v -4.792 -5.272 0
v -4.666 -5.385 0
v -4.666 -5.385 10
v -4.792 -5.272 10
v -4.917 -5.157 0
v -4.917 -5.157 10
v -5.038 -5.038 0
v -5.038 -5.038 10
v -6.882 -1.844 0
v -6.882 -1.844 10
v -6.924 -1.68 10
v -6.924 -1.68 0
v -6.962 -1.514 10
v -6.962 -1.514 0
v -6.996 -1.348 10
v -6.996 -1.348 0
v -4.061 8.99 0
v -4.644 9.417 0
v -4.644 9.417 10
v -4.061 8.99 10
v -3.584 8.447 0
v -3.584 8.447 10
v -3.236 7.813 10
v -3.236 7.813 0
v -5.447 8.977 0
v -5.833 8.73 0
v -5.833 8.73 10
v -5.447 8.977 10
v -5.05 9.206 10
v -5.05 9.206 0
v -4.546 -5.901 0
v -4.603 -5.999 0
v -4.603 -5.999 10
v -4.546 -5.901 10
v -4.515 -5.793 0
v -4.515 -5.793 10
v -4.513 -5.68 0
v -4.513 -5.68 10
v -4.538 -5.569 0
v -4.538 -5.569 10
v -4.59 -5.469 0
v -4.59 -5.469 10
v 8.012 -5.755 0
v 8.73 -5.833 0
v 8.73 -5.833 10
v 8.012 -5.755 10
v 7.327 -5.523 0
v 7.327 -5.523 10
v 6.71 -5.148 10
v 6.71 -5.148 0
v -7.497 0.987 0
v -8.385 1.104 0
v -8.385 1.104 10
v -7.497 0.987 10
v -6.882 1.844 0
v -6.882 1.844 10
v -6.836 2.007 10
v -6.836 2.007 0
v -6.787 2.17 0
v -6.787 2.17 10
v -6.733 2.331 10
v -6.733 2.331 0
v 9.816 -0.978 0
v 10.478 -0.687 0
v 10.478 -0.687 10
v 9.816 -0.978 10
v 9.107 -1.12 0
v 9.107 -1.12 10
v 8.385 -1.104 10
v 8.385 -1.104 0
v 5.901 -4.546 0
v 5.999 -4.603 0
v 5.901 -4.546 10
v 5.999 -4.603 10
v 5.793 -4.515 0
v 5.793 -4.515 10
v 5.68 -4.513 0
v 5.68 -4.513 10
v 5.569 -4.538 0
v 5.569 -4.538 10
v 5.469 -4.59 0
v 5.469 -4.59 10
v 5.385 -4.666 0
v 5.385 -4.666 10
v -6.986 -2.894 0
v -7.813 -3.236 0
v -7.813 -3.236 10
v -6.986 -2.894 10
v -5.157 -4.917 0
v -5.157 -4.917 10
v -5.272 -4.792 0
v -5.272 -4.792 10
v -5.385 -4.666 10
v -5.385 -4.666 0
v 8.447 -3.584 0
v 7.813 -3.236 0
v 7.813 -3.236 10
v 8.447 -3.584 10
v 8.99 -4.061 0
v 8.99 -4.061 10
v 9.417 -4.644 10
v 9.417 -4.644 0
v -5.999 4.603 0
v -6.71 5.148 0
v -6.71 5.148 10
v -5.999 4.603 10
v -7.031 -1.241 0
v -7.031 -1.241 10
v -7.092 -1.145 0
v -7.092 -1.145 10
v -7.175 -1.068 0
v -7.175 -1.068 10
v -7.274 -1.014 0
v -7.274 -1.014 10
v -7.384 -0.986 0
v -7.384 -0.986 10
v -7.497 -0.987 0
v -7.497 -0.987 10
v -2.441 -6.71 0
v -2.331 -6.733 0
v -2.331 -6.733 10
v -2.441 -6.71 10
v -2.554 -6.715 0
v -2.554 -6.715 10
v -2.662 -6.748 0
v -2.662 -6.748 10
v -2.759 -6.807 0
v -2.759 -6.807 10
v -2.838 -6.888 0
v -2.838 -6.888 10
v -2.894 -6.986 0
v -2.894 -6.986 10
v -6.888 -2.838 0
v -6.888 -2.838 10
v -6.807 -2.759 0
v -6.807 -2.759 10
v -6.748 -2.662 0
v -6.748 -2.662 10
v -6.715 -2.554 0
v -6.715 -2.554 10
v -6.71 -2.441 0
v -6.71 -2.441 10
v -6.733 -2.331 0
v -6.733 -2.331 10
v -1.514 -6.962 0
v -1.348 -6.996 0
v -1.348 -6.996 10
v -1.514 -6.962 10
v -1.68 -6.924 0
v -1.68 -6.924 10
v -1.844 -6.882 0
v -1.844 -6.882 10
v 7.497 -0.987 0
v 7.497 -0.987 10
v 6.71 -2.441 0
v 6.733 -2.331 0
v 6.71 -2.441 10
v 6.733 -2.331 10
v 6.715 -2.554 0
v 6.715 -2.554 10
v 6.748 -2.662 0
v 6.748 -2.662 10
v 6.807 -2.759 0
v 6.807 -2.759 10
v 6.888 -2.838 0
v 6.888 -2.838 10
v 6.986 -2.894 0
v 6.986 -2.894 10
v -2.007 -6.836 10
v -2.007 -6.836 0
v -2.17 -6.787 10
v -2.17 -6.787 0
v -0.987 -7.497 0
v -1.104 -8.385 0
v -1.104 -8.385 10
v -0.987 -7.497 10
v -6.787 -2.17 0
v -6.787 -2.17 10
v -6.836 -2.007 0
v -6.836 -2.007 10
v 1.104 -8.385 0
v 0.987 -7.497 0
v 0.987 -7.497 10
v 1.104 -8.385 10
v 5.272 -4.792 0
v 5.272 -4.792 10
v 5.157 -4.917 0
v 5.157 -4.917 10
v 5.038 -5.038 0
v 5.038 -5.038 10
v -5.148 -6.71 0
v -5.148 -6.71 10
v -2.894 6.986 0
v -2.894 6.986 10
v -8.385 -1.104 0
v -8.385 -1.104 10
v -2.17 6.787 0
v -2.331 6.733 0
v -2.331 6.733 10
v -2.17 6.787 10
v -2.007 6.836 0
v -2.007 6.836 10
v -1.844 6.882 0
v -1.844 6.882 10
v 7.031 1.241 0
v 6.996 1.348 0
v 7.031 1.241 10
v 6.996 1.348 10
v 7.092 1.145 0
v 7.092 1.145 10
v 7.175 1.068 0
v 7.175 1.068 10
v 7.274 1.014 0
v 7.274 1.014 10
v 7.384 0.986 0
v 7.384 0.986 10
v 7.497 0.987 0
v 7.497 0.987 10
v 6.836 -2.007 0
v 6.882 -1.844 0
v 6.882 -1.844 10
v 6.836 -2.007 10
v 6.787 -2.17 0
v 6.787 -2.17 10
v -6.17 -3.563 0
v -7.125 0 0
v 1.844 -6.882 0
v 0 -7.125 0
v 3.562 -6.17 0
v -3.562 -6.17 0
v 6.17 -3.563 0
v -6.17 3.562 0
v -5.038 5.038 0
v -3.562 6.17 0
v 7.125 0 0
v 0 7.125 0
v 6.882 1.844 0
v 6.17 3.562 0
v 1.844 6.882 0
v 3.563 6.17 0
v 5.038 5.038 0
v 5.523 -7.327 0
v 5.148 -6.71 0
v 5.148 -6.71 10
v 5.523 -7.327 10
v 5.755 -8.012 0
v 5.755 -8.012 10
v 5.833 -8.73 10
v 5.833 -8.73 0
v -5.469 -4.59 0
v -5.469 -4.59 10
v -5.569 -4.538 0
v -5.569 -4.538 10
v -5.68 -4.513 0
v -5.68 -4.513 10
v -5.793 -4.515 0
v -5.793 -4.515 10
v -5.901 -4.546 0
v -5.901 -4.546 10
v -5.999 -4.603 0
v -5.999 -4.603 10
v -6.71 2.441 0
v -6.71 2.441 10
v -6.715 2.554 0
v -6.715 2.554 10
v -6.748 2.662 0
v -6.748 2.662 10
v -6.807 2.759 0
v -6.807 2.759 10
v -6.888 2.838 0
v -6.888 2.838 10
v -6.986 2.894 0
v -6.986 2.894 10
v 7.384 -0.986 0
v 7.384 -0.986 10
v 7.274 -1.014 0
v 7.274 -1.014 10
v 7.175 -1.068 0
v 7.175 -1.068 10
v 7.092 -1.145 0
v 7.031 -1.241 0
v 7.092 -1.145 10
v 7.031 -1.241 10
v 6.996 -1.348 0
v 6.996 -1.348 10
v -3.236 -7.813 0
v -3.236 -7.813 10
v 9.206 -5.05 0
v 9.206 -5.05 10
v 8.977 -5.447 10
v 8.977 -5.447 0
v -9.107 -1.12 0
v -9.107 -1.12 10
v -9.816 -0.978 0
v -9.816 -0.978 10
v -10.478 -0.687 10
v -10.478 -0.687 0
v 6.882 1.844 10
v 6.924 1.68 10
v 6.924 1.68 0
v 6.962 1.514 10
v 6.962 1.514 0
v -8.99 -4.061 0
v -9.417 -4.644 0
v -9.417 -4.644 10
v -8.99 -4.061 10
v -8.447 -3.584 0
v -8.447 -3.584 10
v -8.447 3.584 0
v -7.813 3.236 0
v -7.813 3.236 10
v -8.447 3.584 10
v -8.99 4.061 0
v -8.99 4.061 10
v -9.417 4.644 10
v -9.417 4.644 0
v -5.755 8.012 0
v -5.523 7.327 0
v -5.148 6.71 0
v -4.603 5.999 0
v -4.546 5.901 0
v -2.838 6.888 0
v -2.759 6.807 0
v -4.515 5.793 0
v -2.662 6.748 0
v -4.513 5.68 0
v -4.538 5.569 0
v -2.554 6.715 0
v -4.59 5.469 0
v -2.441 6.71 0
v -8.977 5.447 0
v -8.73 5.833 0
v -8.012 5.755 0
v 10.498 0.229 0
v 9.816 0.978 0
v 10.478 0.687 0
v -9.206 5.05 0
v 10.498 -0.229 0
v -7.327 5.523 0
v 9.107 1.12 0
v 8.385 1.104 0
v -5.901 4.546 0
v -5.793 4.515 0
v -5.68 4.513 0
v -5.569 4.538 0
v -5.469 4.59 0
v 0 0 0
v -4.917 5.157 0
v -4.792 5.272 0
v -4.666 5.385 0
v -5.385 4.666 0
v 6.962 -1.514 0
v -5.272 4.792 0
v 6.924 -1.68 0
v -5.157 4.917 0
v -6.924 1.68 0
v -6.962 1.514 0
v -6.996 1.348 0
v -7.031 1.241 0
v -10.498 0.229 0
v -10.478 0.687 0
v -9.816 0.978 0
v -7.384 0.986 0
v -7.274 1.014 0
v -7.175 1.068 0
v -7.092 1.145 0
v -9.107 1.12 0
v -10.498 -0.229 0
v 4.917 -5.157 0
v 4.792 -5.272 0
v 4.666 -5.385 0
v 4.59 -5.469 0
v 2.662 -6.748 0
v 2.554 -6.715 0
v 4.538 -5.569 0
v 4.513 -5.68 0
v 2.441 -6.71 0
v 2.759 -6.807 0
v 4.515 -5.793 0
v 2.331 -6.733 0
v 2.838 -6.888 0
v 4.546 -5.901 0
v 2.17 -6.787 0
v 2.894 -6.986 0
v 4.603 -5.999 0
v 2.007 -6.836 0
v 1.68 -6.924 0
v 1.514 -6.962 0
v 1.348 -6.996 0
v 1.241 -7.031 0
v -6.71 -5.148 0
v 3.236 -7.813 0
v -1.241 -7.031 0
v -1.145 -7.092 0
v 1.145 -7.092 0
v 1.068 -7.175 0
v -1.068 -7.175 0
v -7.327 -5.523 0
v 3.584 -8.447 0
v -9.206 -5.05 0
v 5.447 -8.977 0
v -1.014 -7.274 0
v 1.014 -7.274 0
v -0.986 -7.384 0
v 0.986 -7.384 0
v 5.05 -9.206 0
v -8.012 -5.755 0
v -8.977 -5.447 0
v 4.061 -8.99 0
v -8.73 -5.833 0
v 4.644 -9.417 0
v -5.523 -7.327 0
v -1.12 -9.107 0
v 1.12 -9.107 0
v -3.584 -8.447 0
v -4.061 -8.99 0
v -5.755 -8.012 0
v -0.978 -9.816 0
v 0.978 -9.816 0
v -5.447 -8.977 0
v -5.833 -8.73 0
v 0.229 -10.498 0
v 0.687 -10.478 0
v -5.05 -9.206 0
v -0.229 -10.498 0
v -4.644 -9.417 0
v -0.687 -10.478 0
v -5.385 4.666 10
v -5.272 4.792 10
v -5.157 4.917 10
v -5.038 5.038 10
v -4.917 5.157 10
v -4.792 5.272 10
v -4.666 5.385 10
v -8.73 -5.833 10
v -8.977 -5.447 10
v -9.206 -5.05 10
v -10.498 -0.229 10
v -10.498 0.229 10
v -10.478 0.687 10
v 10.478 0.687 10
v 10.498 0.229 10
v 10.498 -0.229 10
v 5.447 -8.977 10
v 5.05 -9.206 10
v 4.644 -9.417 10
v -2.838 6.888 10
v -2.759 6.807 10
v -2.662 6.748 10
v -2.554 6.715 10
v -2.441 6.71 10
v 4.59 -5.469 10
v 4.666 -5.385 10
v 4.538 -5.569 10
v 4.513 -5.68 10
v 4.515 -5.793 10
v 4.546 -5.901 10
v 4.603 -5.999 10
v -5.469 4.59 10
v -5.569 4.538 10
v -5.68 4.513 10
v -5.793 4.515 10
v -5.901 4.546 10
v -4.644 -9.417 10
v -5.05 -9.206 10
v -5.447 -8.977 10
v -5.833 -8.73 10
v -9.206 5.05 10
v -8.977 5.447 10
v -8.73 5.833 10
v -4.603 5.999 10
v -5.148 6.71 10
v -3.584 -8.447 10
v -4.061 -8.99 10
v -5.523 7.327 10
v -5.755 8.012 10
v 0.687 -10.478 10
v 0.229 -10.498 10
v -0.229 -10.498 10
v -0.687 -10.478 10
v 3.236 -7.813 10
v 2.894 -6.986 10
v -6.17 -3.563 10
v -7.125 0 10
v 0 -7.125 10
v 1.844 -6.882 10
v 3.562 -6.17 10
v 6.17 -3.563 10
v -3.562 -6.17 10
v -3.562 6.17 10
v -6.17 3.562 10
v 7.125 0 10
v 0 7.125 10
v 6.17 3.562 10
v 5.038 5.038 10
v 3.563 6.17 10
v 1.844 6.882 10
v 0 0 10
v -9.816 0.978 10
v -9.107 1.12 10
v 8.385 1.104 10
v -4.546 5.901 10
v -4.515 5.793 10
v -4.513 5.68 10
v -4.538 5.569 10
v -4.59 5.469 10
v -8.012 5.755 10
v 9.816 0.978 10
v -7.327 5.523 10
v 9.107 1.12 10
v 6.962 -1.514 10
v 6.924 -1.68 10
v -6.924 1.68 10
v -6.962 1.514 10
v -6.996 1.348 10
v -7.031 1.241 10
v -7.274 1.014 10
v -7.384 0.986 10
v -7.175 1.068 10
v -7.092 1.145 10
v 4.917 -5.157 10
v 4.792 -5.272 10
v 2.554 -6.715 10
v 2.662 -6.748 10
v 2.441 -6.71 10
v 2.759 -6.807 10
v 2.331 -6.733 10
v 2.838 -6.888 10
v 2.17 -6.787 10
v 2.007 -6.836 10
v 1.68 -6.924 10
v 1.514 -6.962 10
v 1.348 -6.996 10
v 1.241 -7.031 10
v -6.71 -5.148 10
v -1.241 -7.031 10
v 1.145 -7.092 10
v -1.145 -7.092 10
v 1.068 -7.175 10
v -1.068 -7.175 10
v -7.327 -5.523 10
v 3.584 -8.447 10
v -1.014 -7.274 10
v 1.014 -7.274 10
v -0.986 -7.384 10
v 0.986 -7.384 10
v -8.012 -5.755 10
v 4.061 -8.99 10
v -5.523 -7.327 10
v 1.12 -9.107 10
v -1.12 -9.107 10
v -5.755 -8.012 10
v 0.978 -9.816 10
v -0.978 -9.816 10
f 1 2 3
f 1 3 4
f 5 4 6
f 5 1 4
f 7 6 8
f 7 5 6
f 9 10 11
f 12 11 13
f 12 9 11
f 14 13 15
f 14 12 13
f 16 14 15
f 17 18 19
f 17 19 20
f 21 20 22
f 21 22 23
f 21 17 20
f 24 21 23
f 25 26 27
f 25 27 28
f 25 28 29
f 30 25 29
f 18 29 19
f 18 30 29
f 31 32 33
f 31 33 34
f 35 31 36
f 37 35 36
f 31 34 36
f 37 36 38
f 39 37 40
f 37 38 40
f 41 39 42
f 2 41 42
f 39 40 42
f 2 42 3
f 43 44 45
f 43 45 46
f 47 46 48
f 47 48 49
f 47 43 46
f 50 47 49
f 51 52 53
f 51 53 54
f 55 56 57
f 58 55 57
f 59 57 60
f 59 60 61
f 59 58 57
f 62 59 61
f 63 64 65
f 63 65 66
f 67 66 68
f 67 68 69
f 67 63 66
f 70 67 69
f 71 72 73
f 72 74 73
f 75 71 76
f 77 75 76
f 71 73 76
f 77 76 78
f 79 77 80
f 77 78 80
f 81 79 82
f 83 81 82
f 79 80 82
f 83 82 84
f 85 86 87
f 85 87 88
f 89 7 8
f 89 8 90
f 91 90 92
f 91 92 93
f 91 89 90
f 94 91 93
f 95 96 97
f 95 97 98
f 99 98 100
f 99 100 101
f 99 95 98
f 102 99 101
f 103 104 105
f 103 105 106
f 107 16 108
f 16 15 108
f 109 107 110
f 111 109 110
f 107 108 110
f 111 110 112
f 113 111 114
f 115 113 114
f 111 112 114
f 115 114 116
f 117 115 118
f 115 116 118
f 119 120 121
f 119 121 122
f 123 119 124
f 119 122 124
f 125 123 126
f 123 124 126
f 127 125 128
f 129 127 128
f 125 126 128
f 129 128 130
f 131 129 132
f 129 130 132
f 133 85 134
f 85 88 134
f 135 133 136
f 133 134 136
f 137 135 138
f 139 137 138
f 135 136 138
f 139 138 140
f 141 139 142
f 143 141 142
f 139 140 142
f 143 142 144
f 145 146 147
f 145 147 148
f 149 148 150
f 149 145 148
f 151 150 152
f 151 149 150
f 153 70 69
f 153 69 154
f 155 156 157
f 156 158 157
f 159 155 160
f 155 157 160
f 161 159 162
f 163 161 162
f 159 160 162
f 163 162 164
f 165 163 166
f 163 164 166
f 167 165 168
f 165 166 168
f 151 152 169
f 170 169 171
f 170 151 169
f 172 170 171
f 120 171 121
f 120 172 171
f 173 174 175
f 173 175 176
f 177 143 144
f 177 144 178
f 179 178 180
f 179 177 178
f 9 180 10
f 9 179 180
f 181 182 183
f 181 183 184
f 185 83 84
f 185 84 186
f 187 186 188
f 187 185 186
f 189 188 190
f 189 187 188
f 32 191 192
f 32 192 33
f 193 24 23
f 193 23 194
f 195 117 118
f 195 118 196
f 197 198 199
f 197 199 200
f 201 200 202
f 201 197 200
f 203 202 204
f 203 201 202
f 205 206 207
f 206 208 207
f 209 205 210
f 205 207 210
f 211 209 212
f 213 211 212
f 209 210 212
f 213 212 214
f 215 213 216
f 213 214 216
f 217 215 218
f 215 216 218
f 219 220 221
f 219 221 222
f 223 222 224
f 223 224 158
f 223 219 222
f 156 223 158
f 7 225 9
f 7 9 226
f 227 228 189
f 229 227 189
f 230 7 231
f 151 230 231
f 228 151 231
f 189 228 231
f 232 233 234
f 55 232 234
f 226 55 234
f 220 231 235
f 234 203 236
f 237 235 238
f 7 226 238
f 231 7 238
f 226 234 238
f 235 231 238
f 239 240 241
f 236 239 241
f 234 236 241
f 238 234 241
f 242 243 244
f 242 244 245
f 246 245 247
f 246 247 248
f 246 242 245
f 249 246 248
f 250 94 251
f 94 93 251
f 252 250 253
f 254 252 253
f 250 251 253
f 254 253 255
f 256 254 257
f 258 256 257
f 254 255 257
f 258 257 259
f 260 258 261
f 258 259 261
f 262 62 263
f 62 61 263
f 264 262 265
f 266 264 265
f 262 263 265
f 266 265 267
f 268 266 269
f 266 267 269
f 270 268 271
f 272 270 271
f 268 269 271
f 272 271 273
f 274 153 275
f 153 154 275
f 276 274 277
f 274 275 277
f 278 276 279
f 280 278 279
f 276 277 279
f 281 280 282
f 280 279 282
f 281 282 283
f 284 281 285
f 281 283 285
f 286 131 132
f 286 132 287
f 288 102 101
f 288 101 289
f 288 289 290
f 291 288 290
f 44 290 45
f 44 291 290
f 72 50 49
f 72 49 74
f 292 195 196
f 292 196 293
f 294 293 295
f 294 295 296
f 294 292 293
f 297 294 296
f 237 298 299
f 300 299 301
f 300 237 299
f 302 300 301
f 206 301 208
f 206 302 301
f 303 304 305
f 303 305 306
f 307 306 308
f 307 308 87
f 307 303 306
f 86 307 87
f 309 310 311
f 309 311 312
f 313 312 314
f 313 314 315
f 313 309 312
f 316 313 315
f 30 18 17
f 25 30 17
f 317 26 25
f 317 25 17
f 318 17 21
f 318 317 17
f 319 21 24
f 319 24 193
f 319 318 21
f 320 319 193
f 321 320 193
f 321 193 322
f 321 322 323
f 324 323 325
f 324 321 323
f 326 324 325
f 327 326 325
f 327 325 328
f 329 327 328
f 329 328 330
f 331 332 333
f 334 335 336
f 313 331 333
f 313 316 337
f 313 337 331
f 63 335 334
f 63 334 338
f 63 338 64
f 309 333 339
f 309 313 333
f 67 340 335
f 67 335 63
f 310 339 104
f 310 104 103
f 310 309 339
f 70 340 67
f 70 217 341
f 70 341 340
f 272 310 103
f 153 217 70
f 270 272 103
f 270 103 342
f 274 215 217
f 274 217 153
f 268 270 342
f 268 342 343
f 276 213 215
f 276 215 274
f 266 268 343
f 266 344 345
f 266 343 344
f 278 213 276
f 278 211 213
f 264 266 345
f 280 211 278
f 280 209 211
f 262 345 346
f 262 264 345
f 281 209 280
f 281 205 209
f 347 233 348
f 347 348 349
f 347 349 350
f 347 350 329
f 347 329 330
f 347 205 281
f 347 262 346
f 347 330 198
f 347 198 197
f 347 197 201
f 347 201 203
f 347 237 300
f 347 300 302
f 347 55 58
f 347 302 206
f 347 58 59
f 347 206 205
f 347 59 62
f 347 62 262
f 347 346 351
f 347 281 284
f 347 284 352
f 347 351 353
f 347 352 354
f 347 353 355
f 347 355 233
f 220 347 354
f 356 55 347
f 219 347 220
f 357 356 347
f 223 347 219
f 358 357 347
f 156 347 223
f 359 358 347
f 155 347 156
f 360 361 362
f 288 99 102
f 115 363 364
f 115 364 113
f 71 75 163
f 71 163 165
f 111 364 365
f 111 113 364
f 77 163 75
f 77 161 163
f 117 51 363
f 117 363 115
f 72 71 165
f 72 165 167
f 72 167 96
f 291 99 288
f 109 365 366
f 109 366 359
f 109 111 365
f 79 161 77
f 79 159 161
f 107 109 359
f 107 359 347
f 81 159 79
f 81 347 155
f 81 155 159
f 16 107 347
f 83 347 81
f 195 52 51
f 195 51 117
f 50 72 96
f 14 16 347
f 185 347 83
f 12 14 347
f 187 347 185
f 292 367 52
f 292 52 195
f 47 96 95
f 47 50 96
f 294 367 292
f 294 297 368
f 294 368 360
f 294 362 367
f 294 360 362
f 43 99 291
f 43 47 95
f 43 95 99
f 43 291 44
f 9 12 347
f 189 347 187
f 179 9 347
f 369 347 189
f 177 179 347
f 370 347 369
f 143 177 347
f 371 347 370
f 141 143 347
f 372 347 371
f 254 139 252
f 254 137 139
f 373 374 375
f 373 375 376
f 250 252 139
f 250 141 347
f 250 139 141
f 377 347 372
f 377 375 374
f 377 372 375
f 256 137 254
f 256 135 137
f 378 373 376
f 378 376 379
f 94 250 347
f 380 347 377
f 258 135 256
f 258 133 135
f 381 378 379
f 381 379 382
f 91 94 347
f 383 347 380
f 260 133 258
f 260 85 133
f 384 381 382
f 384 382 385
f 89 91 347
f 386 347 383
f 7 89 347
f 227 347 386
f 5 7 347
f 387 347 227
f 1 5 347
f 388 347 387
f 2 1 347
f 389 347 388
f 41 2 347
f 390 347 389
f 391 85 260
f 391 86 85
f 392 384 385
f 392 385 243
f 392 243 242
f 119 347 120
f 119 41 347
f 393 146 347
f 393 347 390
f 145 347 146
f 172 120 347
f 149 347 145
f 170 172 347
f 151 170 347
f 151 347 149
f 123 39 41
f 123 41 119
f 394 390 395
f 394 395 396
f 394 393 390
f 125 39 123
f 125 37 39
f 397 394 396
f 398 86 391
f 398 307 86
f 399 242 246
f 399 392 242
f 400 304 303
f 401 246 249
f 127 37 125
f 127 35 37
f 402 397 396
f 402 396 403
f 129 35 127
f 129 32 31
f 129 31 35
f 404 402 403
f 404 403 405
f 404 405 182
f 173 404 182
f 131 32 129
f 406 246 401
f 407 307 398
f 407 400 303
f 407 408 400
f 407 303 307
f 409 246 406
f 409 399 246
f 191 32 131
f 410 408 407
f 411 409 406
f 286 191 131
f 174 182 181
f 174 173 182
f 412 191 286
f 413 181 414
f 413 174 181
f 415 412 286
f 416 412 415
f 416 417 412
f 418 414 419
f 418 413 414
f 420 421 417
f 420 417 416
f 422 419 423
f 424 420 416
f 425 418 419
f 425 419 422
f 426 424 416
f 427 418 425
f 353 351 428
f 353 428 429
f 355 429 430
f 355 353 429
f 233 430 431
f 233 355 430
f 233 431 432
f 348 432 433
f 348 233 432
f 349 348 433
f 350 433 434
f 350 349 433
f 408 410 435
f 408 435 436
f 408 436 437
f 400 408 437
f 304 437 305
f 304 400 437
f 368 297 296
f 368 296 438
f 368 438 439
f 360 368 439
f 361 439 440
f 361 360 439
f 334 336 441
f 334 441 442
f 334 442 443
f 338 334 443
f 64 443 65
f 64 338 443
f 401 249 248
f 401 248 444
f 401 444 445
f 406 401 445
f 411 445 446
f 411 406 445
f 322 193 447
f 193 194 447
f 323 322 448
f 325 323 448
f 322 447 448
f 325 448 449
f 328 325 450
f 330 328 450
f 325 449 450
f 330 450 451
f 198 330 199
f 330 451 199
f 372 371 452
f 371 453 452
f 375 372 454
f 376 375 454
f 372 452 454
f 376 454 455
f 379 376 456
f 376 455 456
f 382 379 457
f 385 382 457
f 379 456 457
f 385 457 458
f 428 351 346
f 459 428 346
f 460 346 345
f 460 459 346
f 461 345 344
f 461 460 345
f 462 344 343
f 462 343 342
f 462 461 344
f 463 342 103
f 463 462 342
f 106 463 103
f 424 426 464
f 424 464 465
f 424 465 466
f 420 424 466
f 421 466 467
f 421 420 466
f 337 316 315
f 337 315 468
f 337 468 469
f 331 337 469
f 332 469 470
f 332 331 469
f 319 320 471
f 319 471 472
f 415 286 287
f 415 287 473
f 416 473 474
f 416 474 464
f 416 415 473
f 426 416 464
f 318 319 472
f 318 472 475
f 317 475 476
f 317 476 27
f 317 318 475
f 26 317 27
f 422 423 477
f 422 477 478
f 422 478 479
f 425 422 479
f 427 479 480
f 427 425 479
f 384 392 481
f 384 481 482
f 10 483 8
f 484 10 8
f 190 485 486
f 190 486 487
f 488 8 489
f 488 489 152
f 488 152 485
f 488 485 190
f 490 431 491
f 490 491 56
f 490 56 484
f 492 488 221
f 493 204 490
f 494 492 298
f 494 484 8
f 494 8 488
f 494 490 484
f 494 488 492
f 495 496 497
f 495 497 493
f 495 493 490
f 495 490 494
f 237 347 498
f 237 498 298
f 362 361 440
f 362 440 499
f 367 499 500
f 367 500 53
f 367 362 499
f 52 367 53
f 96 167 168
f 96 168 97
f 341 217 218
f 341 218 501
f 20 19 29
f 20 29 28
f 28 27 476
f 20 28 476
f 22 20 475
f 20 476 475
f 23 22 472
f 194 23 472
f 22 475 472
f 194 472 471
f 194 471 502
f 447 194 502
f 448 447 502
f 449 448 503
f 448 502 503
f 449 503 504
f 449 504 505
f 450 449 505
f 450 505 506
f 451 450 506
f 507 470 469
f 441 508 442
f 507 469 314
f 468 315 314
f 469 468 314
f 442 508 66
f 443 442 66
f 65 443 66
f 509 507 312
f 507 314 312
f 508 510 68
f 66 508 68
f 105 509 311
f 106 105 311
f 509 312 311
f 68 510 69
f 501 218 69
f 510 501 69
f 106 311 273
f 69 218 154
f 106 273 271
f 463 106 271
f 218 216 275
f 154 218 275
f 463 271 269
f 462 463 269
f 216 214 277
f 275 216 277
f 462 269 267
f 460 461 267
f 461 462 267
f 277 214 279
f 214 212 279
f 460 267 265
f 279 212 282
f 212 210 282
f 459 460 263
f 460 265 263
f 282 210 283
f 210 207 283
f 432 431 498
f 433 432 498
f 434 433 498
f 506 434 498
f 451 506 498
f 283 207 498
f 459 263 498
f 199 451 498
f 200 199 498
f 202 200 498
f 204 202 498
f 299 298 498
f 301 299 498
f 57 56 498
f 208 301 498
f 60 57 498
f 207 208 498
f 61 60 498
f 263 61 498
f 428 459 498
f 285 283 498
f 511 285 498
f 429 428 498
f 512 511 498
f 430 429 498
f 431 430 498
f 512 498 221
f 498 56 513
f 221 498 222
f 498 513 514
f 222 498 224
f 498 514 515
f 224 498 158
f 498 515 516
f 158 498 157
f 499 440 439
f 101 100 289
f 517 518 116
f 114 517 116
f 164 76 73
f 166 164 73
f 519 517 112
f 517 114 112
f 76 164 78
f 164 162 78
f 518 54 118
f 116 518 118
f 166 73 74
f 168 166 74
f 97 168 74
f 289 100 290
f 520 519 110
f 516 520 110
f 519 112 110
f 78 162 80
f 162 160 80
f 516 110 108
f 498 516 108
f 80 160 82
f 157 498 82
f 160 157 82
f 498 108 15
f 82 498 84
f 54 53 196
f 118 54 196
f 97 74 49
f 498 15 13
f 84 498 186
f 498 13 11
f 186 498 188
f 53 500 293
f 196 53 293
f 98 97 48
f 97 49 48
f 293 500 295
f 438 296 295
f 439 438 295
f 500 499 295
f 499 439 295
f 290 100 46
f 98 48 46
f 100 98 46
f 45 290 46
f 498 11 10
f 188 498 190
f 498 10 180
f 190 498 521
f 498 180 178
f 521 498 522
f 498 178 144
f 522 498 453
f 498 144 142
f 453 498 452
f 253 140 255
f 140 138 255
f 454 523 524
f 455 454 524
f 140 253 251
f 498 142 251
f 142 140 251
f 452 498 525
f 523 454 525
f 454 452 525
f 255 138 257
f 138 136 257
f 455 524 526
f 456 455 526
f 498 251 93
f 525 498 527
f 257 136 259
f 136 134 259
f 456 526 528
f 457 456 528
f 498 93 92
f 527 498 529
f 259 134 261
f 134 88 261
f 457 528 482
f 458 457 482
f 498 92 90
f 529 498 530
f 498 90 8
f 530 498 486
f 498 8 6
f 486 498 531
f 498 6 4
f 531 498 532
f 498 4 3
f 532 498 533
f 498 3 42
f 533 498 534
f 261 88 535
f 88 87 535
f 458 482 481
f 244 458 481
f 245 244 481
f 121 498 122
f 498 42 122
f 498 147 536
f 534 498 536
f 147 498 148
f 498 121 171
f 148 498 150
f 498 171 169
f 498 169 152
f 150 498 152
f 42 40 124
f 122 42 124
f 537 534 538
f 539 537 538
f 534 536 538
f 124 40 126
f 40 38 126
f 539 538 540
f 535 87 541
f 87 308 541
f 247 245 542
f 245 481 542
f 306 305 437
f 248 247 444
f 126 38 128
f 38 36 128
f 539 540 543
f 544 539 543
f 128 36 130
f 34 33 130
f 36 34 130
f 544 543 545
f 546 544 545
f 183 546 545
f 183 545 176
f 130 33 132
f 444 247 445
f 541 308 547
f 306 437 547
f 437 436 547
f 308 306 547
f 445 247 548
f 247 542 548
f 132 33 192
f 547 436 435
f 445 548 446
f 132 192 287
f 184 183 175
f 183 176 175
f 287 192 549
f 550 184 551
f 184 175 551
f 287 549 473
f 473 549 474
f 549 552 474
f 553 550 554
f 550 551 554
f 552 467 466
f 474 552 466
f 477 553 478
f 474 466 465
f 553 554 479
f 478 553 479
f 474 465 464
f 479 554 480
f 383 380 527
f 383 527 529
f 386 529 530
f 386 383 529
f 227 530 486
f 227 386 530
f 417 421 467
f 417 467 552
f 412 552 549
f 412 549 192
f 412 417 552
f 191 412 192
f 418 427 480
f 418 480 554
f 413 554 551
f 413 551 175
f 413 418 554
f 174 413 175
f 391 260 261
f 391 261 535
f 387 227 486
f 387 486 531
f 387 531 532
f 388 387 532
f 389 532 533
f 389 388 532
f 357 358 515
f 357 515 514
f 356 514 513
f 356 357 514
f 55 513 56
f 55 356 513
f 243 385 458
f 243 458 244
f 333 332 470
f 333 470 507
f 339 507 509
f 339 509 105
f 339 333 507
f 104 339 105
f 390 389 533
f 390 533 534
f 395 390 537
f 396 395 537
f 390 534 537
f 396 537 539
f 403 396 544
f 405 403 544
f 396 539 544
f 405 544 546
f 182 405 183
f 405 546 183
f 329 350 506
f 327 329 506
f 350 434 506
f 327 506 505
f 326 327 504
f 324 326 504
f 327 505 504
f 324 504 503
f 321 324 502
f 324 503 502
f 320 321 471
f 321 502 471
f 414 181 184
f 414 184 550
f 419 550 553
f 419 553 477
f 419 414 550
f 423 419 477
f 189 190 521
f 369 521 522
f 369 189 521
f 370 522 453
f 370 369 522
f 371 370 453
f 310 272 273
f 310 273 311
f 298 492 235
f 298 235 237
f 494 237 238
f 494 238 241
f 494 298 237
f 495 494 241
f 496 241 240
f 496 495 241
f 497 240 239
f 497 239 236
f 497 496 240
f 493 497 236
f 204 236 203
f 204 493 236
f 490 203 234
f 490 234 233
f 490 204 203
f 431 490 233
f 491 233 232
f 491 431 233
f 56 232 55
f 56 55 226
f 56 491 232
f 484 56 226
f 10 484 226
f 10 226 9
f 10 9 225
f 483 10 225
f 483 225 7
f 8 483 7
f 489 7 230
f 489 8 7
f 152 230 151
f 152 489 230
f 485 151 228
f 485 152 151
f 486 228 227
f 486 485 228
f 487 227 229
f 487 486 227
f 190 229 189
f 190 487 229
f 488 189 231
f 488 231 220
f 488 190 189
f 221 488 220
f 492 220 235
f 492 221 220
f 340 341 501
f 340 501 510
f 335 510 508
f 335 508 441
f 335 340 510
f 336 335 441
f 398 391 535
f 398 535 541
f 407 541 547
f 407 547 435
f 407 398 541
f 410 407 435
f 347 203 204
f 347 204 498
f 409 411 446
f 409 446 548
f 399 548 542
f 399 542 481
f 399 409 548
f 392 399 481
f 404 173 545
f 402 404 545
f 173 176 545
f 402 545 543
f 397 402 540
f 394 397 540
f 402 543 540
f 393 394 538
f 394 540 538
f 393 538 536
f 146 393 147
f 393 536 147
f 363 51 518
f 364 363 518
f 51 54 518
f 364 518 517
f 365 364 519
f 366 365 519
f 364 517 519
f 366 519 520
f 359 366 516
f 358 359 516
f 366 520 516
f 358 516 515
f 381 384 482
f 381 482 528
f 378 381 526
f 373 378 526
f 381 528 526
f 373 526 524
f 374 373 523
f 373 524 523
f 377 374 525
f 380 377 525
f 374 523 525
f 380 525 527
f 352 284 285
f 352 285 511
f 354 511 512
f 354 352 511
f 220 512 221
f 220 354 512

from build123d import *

# Parameters (mm, degrees)
MAINGEAR_DEPTH                     = 10
CONG_1_R                           = 0.45
R_P_TITION_CIRCULAIRE1_COUNT       = 9
R_P_TITION_CIRCULAIRE1_ANGLE       = 240
CONG_1_OF_R_P_TITION_CIRCULAIRE1_R = 0.45
ESQUISSE5_R                        = 7.125
MAINBASECIRCLE_DEPTH               = 10


with BuildPart() as part:
    # Esquisse1 → MainGear (new body)
    with BuildSketch(Plane.XY):
        with BuildLine():
            Line((0, 0), (6.882221512, 1.844085696))
            ThreePointArc((6.882221512, 1.844085696), (6.988095123, 1.390018544), (7.064044637, 0.92999912))
            Line((7.064044637, 0.92999912), (8.384880781, 1.103890497))
            ThreePointArc((8.384880781, 1.103890497), (9.465680859, 1.068283463), (10.477518694, 0.686732857))
            ThreePointArc((10.477518694, 0.686732857), (10.5, 0), (10.477518694, -0.686732857))
            ThreePointArc((10.477518694, -0.686732857), (9.465680859, -1.068283463), (8.384880781, -1.103890497))
            Line((8.384880781, -1.103890497), (7.064044637, -0.92999912))
            ThreePointArc((7.064044637, -0.92999912), (6.988095123, -1.390018544), (6.882221512, -1.844085696))
            Line((6.882221512, -1.844085696), (0, 0))
        make_face()
    maingear = extrude(amount=MAINGEAR_DEPTH)

    # Congé1
    cong_1_edges = [part.edges().sort_by_distance(p)[0] for p in [
        (7.064044637, 0.92999912, 5),
        (7.064044637, -0.92999912, 5),
    ]]
    fillet(cong_1_edges, radius=CONG_1_R)

    # Répétition circulaire1: MainGear ×9 about axis
    r_p_tition_circulaire1_axis = Axis((0, 0, 0), (0, 0, -1))
    for i in range(1, R_P_TITION_CIRCULAIRE1_COUNT):
        add(maingear.rotate(r_p_tition_circulaire1_axis, i * R_P_TITION_CIRCULAIRE1_ANGLE / (R_P_TITION_CIRCULAIRE1_COUNT - 1)))

    # Congé1 of Répétition circulaire1
    cong_1_of_r_p_tition_circulaire1_edges = [part.edges().sort_by_distance(p)[0] for p in [
        (6.582641669, -2.726619456, 5),
        (5.65264255, -4.337425182, 5),
        (4.337425182, -5.65264255, 5),
        (2.726619456, -6.582641669, 5),
        (0.92999912, -7.064044637, 5),
        (-0.92999912, -7.064044637, 5),
        (-2.726619456, -6.582641669, 5),
        (-4.337425182, -5.65264255, 5),
        (-5.65264255, -4.337425182, 5),
        (-6.582641669, -2.726619456, 5),
        (-7.064044637, -0.92999912, 5),
        (-7.064044637, 0.92999912, 5),
        (-6.582641669, 2.726619456, 5),
        (-5.65264255, 4.337425182, 5),
        (-4.337425182, 5.65264255, 5),
        (-2.726619456, 6.582641669, 5),
    ]]
    fillet(cong_1_of_r_p_tition_circulaire1_edges, radius=CONG_1_OF_R_P_TITION_CIRCULAIRE1_R)


with BuildPart() as body_2:
    # Esquisse5 → MainBaseCircle (new body, through all)
    with BuildSketch(Plane.XY.offset(10)):
        Circle(ESQUISSE5_R)
    extrude(amount=-MAINBASECIRCLE_DEPTH)


solid = Compound([part.part, body_2.part])
